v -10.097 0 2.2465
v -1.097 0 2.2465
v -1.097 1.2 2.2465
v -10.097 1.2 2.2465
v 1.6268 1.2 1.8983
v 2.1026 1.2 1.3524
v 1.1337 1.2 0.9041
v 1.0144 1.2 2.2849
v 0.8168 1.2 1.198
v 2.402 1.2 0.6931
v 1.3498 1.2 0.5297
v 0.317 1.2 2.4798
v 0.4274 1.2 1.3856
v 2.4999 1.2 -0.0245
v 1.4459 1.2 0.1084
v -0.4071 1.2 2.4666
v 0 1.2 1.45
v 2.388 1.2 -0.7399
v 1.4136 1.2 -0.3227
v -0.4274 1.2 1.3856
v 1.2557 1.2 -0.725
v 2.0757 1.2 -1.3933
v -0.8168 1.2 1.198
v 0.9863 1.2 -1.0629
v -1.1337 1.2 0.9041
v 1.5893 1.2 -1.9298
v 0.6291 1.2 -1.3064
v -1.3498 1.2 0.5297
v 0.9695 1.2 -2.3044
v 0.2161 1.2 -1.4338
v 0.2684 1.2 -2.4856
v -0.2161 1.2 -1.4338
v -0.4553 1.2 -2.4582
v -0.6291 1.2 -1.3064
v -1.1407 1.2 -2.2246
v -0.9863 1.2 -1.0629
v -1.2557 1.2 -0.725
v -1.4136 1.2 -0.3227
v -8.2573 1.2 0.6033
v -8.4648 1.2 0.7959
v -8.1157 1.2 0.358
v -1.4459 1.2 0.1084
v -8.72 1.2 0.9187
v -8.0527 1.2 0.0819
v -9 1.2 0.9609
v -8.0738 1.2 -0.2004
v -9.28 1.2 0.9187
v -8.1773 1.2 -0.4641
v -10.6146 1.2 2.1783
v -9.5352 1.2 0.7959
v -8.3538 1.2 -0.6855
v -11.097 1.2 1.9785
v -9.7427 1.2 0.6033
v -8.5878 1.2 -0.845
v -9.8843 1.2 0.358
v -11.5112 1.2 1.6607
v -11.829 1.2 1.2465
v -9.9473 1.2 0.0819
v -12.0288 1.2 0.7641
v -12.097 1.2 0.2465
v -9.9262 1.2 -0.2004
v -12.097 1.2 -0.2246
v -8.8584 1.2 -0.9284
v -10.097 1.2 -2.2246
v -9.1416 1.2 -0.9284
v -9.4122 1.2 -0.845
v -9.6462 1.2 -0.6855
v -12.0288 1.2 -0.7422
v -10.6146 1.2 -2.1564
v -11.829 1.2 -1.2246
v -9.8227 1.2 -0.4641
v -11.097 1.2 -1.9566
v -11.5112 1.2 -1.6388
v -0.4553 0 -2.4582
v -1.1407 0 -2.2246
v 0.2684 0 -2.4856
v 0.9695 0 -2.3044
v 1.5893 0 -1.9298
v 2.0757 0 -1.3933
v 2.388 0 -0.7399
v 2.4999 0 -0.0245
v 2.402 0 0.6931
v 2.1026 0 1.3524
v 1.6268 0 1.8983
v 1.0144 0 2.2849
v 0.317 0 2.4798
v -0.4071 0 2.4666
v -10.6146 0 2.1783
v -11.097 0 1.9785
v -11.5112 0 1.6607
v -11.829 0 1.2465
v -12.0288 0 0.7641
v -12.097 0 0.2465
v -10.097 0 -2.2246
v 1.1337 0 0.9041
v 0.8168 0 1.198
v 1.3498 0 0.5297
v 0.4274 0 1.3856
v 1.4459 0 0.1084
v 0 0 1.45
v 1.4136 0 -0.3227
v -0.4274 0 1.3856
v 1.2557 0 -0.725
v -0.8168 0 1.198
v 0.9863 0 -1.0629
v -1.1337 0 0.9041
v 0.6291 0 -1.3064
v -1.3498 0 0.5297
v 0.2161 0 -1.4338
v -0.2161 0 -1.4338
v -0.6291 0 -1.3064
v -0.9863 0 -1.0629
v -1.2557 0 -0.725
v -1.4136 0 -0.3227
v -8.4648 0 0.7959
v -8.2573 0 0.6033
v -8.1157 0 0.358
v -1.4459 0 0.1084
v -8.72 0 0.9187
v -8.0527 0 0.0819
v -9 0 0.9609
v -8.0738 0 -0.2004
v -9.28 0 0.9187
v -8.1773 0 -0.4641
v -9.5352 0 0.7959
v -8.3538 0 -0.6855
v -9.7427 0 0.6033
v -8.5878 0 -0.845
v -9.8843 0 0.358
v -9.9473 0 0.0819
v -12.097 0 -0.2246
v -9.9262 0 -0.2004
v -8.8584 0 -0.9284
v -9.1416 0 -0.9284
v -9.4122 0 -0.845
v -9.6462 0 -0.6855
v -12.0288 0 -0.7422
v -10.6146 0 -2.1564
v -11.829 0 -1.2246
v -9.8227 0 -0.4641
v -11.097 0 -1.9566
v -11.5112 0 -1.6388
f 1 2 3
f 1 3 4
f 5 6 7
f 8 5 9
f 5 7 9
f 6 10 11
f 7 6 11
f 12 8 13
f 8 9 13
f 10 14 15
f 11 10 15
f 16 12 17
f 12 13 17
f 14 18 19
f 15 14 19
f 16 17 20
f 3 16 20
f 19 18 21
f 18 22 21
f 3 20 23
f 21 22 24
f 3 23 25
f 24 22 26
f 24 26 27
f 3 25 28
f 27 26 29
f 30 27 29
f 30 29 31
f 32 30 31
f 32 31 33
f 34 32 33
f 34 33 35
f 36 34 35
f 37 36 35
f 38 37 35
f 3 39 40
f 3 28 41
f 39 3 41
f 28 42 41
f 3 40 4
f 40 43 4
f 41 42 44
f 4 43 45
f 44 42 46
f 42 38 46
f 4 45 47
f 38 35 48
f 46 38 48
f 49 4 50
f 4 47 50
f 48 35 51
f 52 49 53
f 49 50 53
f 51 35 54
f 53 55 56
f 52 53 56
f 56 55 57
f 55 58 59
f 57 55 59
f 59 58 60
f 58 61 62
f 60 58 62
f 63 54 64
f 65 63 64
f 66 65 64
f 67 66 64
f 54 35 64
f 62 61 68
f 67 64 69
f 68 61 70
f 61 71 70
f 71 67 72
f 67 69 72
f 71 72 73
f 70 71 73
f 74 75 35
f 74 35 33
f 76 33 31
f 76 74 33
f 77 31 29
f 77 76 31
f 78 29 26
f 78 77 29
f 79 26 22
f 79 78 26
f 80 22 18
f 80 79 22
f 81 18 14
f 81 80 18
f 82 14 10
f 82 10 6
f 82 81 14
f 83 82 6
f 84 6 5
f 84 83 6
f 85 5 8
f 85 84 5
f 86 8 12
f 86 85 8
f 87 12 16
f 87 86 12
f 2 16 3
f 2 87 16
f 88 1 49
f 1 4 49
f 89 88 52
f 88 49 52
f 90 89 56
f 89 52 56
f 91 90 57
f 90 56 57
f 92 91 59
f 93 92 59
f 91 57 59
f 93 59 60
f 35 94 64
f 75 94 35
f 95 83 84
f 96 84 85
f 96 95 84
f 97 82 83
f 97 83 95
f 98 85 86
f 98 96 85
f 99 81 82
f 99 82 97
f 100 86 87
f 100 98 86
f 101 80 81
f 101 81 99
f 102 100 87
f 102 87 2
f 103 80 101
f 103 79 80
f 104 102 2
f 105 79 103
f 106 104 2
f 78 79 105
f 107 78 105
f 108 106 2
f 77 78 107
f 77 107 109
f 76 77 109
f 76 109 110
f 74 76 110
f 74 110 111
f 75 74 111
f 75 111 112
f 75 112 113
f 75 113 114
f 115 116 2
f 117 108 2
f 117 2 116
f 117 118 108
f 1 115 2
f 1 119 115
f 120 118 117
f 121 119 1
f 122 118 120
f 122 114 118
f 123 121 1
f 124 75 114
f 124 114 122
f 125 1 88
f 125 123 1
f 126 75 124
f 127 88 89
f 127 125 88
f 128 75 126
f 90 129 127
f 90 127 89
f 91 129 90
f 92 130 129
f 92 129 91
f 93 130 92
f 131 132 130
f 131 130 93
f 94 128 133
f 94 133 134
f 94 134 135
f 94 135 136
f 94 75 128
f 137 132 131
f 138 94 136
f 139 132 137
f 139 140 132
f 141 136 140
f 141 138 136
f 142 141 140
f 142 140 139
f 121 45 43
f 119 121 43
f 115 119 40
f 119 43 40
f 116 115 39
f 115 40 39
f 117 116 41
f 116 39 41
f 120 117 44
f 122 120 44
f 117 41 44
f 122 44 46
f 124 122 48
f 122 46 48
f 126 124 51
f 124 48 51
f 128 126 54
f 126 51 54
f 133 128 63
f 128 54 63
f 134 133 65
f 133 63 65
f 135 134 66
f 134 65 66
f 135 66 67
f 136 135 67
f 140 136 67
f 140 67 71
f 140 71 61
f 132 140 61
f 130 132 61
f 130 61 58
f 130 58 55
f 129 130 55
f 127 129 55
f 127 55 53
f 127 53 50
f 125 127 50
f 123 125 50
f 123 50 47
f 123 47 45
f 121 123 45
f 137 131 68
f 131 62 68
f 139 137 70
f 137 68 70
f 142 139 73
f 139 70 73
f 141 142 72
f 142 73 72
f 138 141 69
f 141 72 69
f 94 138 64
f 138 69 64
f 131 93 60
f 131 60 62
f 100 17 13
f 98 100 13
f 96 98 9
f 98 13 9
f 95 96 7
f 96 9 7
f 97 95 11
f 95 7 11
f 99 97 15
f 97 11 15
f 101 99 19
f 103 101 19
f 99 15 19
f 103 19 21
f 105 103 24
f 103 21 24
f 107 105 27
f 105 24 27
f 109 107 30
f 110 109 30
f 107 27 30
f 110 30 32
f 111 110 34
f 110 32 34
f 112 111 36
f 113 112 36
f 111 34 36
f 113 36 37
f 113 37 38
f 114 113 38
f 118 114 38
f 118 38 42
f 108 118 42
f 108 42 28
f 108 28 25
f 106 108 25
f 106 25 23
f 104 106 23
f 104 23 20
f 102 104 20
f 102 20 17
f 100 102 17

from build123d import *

# Parameters (mm, degrees)
EXTRUDE_1_DEPTH     = 1.2
SKETCH_2_R          = 1.45
CUT_EXTRUDE_1_DEPTH = 13.410758407
FILLET_1_R          = 2
SKETCH_3_R          = 0.95
CUT_EXTRUDE_2_DEPTH = 13.410758407


with BuildPart() as part:
    # 草图1 → 凸台-拉伸1 (new body)
    with BuildSketch(Plane(origin=(0, 0, 0), x_dir=(1, 0, 0), z_dir=(0, 1, 0))):
        with BuildLine():
            Line((-1.096979963, -2.246471669), (-12.096979963, -2.246471669))
            Line((-12.096979963, -2.246471669), (-12.096979963, 2.224581144))
            Line((-12.096979963, 2.224581144), (-1.140718517, 2.224581144))
            ThreePointArc((-1.140718517, 2.224581144), (2.499880384, 0.024455348), (-1.096979963, -2.246471669))
        make_face()
    extrude(amount=EXTRUDE_1_DEPTH)

    # 草图2 → 切除-拉伸1 (cut, through all)
    with BuildSketch(Plane(origin=(0, 1.2, 0), x_dir=(1, 0, 0), z_dir=(0, 1, 0))):
        with Locations(Location((0, 0, 0), (0, 0, 270))):
            Circle(SKETCH_2_R)
    extrude(amount=-CUT_EXTRUDE_1_DEPTH, mode=Mode.SUBTRACT)

    # 圆角1
    fillet_1_edges = [part.edges().sort_by_distance(p)[0] for p in [
        (-12.096979963, 0.6, 2.246471669),
        (-12.096979963, 0.6, -2.224581144),
    ]]
    fillet(fillet_1_edges, radius=FILLET_1_R)

    # 草图3 → 切除-拉伸2 (cut, through all)
    with BuildSketch(Plane(origin=(0, 1.2, 0), x_dir=(1, 0, 0), z_dir=(0, 1, 0))):
        with Locations(Location((-9, -0.010945263, 0), (0, 0, 270))):
            Circle(SKETCH_3_R)
    extrude(amount=-CUT_EXTRUDE_2_DEPTH, mode=Mode.SUBTRACT)


solid = part.part
